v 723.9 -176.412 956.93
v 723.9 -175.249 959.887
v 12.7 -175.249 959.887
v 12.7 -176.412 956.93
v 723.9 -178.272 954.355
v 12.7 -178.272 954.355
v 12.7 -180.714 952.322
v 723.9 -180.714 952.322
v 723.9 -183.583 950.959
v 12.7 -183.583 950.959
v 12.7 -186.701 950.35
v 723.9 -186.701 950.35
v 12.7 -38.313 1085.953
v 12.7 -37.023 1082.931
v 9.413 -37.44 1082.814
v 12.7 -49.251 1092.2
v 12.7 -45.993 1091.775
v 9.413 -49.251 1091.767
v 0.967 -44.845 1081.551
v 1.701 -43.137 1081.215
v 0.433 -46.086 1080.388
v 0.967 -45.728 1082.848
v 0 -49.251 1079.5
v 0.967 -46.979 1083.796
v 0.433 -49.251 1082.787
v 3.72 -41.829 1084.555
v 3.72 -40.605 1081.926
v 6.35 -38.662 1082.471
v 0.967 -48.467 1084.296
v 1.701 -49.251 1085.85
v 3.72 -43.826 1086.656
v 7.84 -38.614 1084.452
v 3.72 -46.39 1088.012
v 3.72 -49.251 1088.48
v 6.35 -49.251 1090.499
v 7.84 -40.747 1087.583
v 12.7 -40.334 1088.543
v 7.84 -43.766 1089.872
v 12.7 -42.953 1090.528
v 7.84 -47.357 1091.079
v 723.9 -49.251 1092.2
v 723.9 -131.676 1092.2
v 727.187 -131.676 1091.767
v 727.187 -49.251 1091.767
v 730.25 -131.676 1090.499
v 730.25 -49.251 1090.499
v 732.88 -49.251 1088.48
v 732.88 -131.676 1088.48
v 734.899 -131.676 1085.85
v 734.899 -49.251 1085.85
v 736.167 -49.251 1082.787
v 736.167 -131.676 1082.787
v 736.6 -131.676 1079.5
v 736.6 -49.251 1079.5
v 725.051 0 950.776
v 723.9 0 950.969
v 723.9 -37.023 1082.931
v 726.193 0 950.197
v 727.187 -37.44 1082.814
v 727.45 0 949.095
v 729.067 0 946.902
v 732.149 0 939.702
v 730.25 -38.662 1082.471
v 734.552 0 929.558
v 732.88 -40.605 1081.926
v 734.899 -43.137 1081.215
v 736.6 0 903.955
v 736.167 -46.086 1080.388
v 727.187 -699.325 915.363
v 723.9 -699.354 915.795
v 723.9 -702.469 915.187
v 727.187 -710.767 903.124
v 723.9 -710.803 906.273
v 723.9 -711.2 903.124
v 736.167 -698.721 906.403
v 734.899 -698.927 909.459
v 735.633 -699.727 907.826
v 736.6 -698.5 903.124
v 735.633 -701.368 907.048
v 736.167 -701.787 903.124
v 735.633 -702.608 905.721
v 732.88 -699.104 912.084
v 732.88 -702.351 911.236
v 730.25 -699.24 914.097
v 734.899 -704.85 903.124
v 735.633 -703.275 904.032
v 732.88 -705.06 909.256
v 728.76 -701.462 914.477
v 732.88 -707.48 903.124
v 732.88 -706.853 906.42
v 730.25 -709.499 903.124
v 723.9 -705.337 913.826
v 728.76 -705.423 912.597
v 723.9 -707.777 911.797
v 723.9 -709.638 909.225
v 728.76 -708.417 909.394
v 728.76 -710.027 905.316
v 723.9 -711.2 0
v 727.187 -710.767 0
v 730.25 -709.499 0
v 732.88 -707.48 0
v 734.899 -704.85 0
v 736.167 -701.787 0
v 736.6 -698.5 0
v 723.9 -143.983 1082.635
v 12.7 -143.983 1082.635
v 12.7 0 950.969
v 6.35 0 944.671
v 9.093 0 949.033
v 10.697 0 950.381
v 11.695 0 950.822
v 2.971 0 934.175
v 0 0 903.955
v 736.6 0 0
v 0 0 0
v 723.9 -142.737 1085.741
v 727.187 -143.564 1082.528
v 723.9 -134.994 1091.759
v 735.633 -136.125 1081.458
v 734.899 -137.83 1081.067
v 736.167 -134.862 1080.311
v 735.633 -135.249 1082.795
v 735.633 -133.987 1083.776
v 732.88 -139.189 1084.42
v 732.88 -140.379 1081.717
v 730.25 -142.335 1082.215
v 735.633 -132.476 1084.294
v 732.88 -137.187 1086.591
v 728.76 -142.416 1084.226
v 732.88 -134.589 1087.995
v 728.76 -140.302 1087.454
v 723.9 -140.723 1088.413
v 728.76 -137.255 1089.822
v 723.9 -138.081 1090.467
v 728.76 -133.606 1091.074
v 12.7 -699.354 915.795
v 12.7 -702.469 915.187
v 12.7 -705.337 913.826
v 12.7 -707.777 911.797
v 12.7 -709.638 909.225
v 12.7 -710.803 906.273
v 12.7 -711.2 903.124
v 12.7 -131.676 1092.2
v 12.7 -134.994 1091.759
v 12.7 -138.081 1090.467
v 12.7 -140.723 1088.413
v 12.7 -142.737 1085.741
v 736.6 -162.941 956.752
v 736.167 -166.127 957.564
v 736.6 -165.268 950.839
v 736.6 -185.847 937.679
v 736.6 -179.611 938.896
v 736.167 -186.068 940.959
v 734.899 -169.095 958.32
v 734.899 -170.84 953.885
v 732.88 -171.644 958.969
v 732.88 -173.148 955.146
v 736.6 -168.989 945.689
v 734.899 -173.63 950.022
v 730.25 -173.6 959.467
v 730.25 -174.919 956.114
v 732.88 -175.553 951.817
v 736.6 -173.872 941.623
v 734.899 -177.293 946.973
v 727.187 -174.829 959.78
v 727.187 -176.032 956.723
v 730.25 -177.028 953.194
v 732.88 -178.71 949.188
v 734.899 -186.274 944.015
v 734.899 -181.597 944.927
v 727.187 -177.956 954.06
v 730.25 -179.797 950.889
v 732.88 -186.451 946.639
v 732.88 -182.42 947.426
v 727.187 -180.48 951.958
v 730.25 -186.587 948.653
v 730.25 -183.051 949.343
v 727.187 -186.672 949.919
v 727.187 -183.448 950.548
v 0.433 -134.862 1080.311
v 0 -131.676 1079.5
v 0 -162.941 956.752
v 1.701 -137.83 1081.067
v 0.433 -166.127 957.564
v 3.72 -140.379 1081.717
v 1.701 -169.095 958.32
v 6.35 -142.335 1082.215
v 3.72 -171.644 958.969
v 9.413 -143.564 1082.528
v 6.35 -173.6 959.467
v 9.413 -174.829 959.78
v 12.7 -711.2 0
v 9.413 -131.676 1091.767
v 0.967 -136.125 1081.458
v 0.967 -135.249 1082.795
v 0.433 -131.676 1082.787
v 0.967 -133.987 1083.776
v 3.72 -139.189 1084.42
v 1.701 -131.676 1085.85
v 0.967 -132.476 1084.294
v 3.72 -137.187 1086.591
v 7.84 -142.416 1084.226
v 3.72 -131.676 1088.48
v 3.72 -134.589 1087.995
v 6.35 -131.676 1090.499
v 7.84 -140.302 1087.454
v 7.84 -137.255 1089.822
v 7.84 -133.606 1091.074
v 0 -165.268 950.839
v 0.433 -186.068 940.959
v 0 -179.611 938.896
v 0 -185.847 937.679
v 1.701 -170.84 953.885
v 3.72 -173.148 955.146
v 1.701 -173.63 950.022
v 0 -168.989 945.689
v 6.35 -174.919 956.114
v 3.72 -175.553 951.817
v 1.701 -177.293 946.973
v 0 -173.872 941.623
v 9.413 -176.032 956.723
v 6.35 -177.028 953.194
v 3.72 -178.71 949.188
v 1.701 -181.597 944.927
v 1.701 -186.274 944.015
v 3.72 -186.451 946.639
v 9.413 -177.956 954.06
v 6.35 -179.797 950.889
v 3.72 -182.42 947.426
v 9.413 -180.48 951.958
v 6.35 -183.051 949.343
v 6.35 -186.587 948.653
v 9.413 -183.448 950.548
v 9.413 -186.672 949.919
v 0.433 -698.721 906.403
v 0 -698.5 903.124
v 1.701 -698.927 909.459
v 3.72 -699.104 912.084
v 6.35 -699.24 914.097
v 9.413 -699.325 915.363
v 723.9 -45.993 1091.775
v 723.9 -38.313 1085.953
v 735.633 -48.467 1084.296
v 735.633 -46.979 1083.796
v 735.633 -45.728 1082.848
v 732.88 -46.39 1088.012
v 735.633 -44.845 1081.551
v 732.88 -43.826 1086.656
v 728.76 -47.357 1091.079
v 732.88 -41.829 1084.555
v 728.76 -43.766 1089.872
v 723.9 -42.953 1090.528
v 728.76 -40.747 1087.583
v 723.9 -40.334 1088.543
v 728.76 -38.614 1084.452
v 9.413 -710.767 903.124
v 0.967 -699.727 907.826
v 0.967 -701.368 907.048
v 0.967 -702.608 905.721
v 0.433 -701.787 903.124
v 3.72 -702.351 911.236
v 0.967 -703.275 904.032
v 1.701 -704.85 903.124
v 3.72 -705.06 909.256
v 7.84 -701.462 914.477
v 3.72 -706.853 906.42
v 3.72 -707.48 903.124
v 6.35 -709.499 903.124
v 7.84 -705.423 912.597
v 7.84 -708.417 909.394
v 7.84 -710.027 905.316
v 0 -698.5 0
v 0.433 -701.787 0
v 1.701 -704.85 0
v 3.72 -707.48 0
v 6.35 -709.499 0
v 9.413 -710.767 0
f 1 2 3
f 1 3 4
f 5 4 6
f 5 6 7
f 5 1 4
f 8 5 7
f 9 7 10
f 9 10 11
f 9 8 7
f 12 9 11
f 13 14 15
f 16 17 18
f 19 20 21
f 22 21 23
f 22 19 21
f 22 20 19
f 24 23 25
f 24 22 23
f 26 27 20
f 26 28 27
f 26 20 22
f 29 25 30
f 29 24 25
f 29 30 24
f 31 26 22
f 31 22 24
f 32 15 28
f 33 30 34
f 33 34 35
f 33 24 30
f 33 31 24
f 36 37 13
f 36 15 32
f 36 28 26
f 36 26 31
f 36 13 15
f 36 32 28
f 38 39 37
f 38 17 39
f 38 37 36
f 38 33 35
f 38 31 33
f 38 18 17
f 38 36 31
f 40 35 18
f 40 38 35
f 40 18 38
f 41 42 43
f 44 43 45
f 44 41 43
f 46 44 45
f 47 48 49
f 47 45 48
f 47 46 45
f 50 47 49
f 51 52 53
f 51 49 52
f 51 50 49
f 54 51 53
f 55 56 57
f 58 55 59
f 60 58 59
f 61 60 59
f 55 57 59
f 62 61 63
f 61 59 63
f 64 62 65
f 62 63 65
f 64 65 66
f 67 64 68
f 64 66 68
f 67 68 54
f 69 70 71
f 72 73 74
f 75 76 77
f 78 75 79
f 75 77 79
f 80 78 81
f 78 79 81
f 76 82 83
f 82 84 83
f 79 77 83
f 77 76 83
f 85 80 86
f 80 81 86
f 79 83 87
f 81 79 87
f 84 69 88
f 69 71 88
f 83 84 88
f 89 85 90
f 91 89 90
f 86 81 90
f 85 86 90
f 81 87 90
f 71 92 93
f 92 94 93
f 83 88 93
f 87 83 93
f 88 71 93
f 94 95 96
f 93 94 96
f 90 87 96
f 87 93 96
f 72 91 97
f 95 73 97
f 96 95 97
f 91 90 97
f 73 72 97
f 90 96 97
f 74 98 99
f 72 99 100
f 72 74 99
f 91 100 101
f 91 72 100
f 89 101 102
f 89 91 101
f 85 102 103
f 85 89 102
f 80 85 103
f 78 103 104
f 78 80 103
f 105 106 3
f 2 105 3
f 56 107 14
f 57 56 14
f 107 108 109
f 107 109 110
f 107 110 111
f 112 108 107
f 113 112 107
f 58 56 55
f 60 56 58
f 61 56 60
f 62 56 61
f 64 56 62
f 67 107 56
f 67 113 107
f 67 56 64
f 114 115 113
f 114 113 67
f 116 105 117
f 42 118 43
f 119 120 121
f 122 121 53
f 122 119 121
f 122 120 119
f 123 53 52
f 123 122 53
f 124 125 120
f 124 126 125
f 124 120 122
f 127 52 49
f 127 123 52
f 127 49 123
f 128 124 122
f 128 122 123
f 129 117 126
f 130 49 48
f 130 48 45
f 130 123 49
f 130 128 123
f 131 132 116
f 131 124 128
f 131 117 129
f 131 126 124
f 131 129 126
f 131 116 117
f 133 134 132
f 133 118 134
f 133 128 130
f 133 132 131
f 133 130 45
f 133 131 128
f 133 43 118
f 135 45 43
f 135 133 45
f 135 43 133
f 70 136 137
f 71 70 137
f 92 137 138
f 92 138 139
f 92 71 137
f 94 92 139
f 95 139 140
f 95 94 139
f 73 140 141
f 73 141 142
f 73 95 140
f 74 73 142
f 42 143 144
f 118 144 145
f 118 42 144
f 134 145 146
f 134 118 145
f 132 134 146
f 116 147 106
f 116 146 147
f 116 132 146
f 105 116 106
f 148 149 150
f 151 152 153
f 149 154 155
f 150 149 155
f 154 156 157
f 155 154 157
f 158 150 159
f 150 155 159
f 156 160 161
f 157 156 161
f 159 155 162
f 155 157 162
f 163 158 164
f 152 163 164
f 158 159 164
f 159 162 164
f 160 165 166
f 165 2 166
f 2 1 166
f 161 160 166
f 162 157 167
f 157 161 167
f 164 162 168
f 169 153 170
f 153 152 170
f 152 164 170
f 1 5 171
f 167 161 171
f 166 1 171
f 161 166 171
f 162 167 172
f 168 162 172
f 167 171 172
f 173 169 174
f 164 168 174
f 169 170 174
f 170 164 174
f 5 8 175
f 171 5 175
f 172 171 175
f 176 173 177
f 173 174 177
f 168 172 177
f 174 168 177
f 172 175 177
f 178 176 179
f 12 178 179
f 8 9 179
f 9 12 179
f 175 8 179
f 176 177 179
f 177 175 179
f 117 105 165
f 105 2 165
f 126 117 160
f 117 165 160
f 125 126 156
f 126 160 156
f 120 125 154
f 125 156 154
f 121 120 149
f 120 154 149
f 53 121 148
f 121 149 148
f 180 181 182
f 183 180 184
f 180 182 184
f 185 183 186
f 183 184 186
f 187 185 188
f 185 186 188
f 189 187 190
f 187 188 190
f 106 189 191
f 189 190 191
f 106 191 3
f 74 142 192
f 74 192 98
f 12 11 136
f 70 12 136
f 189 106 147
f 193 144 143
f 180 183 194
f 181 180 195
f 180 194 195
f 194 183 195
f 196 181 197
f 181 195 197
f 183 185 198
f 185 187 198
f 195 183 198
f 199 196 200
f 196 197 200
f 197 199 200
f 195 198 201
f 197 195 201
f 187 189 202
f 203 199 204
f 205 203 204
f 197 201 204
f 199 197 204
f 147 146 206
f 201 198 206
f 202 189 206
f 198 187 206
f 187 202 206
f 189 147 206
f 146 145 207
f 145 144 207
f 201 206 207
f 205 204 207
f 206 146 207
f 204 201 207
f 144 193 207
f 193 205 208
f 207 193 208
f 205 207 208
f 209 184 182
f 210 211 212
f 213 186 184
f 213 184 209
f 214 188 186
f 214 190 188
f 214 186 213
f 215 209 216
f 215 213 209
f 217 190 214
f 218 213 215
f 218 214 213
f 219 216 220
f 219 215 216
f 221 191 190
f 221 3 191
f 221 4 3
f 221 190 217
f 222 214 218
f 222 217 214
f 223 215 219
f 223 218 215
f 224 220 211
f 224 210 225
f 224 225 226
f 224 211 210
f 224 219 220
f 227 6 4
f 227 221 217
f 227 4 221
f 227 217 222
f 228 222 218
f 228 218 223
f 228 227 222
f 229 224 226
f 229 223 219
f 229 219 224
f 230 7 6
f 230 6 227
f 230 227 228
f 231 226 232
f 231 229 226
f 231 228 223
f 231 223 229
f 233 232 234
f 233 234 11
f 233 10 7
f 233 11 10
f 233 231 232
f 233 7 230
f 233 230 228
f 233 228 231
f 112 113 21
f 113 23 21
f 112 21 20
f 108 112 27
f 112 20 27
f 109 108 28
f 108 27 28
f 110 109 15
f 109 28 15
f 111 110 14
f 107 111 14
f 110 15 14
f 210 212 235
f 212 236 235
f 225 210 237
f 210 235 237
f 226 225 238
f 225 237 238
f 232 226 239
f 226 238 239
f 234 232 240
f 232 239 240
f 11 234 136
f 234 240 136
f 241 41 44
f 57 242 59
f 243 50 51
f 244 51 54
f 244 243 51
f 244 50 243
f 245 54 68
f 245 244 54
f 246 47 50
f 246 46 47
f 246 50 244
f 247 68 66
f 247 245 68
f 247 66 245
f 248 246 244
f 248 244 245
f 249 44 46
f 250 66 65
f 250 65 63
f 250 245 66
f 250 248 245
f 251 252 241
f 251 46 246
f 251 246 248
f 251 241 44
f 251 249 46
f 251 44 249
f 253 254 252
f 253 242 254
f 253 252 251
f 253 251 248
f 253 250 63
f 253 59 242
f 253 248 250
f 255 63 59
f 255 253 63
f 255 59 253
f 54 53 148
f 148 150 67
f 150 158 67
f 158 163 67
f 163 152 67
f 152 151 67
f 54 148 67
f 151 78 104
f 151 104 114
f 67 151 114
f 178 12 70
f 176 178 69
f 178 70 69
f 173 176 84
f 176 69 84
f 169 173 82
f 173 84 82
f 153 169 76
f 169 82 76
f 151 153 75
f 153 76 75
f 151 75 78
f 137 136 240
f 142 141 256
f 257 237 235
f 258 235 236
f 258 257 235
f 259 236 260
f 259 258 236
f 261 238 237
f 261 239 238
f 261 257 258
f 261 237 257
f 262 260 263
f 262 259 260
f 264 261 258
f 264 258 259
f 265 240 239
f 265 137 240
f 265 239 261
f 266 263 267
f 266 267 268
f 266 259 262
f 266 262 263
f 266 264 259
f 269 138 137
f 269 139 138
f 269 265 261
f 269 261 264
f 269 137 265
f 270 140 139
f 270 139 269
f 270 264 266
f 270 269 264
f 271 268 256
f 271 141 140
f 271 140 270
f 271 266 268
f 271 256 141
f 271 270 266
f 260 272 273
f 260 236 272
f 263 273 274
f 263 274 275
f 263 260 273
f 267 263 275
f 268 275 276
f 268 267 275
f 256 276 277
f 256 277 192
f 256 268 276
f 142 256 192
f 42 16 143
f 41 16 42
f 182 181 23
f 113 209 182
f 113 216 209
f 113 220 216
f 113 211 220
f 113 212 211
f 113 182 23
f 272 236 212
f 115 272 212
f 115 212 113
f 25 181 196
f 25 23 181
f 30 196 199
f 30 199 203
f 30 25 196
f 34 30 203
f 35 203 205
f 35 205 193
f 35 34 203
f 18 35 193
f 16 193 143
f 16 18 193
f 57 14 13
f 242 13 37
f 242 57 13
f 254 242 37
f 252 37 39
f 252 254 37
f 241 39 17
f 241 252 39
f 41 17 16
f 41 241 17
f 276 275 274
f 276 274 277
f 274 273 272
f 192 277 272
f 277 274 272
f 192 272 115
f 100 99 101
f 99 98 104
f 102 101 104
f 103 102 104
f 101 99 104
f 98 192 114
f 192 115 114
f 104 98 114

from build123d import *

# Parameters (mm, degrees)
F0_W     = 736.6
F0_H     = 711.2
F1_DEPTH = 1092.2
F3_DEPTH = 736.601
F4_R     = 12.7


with BuildPart() as f1:
    # F0 (on Top) → F1 (new body)
    with BuildSketch(Plane.XY):
        with Locations((368.3, -355.6)):
            Rectangle(F0_W, F0_H)
    extrude(amount=F1_DEPTH)

    # F2 (on face) → F3 (cut, through all)
    with BuildSketch(Plane(origin=(0, 0, 0), x_dir=(0, -1, 0), z_dir=(-1, 0, 0))):
        Polygon((711.2, 1092.2), (141.5470689535, 1092.2), (177.5199323893, 950.9692788124), (711.2, 914.996445179), align=None)
        Polygon((0, 1092.2), (0, 950.9692788124), (39.6239757538, 1092.2), align=None)
    extrude(amount=-F3_DEPTH, mode=Mode.SUBTRACT)

    # F4
    f4_edges = [f1.edges().sort_by_distance(p)[0] for p in [
        (0, -711.2, 457.498223),
        (736.6, -711.2, 457.498223),
        (368.3, -711.2, 914.996445),
        (0, -444.359966, 932.982862),
        (736.6, -444.359966, 932.982862),
        (368.3, -177.519932, 950.969279),
        (368.3, -141.547069, 1092.2),
        (368.3, -39.623976, 1092.2),
        (0, -159.533501, 1021.584639),
        (736.6, -159.533501, 1021.584639),
        (0, -19.811988, 1021.584639),
        (736.6, -90.585522, 1092.2),
        (736.6, -19.811988, 1021.584639),
        (0, -90.585522, 1092.2),
    ]]
    fillet(f4_edges, radius=F4_R)


solid = f1.part
